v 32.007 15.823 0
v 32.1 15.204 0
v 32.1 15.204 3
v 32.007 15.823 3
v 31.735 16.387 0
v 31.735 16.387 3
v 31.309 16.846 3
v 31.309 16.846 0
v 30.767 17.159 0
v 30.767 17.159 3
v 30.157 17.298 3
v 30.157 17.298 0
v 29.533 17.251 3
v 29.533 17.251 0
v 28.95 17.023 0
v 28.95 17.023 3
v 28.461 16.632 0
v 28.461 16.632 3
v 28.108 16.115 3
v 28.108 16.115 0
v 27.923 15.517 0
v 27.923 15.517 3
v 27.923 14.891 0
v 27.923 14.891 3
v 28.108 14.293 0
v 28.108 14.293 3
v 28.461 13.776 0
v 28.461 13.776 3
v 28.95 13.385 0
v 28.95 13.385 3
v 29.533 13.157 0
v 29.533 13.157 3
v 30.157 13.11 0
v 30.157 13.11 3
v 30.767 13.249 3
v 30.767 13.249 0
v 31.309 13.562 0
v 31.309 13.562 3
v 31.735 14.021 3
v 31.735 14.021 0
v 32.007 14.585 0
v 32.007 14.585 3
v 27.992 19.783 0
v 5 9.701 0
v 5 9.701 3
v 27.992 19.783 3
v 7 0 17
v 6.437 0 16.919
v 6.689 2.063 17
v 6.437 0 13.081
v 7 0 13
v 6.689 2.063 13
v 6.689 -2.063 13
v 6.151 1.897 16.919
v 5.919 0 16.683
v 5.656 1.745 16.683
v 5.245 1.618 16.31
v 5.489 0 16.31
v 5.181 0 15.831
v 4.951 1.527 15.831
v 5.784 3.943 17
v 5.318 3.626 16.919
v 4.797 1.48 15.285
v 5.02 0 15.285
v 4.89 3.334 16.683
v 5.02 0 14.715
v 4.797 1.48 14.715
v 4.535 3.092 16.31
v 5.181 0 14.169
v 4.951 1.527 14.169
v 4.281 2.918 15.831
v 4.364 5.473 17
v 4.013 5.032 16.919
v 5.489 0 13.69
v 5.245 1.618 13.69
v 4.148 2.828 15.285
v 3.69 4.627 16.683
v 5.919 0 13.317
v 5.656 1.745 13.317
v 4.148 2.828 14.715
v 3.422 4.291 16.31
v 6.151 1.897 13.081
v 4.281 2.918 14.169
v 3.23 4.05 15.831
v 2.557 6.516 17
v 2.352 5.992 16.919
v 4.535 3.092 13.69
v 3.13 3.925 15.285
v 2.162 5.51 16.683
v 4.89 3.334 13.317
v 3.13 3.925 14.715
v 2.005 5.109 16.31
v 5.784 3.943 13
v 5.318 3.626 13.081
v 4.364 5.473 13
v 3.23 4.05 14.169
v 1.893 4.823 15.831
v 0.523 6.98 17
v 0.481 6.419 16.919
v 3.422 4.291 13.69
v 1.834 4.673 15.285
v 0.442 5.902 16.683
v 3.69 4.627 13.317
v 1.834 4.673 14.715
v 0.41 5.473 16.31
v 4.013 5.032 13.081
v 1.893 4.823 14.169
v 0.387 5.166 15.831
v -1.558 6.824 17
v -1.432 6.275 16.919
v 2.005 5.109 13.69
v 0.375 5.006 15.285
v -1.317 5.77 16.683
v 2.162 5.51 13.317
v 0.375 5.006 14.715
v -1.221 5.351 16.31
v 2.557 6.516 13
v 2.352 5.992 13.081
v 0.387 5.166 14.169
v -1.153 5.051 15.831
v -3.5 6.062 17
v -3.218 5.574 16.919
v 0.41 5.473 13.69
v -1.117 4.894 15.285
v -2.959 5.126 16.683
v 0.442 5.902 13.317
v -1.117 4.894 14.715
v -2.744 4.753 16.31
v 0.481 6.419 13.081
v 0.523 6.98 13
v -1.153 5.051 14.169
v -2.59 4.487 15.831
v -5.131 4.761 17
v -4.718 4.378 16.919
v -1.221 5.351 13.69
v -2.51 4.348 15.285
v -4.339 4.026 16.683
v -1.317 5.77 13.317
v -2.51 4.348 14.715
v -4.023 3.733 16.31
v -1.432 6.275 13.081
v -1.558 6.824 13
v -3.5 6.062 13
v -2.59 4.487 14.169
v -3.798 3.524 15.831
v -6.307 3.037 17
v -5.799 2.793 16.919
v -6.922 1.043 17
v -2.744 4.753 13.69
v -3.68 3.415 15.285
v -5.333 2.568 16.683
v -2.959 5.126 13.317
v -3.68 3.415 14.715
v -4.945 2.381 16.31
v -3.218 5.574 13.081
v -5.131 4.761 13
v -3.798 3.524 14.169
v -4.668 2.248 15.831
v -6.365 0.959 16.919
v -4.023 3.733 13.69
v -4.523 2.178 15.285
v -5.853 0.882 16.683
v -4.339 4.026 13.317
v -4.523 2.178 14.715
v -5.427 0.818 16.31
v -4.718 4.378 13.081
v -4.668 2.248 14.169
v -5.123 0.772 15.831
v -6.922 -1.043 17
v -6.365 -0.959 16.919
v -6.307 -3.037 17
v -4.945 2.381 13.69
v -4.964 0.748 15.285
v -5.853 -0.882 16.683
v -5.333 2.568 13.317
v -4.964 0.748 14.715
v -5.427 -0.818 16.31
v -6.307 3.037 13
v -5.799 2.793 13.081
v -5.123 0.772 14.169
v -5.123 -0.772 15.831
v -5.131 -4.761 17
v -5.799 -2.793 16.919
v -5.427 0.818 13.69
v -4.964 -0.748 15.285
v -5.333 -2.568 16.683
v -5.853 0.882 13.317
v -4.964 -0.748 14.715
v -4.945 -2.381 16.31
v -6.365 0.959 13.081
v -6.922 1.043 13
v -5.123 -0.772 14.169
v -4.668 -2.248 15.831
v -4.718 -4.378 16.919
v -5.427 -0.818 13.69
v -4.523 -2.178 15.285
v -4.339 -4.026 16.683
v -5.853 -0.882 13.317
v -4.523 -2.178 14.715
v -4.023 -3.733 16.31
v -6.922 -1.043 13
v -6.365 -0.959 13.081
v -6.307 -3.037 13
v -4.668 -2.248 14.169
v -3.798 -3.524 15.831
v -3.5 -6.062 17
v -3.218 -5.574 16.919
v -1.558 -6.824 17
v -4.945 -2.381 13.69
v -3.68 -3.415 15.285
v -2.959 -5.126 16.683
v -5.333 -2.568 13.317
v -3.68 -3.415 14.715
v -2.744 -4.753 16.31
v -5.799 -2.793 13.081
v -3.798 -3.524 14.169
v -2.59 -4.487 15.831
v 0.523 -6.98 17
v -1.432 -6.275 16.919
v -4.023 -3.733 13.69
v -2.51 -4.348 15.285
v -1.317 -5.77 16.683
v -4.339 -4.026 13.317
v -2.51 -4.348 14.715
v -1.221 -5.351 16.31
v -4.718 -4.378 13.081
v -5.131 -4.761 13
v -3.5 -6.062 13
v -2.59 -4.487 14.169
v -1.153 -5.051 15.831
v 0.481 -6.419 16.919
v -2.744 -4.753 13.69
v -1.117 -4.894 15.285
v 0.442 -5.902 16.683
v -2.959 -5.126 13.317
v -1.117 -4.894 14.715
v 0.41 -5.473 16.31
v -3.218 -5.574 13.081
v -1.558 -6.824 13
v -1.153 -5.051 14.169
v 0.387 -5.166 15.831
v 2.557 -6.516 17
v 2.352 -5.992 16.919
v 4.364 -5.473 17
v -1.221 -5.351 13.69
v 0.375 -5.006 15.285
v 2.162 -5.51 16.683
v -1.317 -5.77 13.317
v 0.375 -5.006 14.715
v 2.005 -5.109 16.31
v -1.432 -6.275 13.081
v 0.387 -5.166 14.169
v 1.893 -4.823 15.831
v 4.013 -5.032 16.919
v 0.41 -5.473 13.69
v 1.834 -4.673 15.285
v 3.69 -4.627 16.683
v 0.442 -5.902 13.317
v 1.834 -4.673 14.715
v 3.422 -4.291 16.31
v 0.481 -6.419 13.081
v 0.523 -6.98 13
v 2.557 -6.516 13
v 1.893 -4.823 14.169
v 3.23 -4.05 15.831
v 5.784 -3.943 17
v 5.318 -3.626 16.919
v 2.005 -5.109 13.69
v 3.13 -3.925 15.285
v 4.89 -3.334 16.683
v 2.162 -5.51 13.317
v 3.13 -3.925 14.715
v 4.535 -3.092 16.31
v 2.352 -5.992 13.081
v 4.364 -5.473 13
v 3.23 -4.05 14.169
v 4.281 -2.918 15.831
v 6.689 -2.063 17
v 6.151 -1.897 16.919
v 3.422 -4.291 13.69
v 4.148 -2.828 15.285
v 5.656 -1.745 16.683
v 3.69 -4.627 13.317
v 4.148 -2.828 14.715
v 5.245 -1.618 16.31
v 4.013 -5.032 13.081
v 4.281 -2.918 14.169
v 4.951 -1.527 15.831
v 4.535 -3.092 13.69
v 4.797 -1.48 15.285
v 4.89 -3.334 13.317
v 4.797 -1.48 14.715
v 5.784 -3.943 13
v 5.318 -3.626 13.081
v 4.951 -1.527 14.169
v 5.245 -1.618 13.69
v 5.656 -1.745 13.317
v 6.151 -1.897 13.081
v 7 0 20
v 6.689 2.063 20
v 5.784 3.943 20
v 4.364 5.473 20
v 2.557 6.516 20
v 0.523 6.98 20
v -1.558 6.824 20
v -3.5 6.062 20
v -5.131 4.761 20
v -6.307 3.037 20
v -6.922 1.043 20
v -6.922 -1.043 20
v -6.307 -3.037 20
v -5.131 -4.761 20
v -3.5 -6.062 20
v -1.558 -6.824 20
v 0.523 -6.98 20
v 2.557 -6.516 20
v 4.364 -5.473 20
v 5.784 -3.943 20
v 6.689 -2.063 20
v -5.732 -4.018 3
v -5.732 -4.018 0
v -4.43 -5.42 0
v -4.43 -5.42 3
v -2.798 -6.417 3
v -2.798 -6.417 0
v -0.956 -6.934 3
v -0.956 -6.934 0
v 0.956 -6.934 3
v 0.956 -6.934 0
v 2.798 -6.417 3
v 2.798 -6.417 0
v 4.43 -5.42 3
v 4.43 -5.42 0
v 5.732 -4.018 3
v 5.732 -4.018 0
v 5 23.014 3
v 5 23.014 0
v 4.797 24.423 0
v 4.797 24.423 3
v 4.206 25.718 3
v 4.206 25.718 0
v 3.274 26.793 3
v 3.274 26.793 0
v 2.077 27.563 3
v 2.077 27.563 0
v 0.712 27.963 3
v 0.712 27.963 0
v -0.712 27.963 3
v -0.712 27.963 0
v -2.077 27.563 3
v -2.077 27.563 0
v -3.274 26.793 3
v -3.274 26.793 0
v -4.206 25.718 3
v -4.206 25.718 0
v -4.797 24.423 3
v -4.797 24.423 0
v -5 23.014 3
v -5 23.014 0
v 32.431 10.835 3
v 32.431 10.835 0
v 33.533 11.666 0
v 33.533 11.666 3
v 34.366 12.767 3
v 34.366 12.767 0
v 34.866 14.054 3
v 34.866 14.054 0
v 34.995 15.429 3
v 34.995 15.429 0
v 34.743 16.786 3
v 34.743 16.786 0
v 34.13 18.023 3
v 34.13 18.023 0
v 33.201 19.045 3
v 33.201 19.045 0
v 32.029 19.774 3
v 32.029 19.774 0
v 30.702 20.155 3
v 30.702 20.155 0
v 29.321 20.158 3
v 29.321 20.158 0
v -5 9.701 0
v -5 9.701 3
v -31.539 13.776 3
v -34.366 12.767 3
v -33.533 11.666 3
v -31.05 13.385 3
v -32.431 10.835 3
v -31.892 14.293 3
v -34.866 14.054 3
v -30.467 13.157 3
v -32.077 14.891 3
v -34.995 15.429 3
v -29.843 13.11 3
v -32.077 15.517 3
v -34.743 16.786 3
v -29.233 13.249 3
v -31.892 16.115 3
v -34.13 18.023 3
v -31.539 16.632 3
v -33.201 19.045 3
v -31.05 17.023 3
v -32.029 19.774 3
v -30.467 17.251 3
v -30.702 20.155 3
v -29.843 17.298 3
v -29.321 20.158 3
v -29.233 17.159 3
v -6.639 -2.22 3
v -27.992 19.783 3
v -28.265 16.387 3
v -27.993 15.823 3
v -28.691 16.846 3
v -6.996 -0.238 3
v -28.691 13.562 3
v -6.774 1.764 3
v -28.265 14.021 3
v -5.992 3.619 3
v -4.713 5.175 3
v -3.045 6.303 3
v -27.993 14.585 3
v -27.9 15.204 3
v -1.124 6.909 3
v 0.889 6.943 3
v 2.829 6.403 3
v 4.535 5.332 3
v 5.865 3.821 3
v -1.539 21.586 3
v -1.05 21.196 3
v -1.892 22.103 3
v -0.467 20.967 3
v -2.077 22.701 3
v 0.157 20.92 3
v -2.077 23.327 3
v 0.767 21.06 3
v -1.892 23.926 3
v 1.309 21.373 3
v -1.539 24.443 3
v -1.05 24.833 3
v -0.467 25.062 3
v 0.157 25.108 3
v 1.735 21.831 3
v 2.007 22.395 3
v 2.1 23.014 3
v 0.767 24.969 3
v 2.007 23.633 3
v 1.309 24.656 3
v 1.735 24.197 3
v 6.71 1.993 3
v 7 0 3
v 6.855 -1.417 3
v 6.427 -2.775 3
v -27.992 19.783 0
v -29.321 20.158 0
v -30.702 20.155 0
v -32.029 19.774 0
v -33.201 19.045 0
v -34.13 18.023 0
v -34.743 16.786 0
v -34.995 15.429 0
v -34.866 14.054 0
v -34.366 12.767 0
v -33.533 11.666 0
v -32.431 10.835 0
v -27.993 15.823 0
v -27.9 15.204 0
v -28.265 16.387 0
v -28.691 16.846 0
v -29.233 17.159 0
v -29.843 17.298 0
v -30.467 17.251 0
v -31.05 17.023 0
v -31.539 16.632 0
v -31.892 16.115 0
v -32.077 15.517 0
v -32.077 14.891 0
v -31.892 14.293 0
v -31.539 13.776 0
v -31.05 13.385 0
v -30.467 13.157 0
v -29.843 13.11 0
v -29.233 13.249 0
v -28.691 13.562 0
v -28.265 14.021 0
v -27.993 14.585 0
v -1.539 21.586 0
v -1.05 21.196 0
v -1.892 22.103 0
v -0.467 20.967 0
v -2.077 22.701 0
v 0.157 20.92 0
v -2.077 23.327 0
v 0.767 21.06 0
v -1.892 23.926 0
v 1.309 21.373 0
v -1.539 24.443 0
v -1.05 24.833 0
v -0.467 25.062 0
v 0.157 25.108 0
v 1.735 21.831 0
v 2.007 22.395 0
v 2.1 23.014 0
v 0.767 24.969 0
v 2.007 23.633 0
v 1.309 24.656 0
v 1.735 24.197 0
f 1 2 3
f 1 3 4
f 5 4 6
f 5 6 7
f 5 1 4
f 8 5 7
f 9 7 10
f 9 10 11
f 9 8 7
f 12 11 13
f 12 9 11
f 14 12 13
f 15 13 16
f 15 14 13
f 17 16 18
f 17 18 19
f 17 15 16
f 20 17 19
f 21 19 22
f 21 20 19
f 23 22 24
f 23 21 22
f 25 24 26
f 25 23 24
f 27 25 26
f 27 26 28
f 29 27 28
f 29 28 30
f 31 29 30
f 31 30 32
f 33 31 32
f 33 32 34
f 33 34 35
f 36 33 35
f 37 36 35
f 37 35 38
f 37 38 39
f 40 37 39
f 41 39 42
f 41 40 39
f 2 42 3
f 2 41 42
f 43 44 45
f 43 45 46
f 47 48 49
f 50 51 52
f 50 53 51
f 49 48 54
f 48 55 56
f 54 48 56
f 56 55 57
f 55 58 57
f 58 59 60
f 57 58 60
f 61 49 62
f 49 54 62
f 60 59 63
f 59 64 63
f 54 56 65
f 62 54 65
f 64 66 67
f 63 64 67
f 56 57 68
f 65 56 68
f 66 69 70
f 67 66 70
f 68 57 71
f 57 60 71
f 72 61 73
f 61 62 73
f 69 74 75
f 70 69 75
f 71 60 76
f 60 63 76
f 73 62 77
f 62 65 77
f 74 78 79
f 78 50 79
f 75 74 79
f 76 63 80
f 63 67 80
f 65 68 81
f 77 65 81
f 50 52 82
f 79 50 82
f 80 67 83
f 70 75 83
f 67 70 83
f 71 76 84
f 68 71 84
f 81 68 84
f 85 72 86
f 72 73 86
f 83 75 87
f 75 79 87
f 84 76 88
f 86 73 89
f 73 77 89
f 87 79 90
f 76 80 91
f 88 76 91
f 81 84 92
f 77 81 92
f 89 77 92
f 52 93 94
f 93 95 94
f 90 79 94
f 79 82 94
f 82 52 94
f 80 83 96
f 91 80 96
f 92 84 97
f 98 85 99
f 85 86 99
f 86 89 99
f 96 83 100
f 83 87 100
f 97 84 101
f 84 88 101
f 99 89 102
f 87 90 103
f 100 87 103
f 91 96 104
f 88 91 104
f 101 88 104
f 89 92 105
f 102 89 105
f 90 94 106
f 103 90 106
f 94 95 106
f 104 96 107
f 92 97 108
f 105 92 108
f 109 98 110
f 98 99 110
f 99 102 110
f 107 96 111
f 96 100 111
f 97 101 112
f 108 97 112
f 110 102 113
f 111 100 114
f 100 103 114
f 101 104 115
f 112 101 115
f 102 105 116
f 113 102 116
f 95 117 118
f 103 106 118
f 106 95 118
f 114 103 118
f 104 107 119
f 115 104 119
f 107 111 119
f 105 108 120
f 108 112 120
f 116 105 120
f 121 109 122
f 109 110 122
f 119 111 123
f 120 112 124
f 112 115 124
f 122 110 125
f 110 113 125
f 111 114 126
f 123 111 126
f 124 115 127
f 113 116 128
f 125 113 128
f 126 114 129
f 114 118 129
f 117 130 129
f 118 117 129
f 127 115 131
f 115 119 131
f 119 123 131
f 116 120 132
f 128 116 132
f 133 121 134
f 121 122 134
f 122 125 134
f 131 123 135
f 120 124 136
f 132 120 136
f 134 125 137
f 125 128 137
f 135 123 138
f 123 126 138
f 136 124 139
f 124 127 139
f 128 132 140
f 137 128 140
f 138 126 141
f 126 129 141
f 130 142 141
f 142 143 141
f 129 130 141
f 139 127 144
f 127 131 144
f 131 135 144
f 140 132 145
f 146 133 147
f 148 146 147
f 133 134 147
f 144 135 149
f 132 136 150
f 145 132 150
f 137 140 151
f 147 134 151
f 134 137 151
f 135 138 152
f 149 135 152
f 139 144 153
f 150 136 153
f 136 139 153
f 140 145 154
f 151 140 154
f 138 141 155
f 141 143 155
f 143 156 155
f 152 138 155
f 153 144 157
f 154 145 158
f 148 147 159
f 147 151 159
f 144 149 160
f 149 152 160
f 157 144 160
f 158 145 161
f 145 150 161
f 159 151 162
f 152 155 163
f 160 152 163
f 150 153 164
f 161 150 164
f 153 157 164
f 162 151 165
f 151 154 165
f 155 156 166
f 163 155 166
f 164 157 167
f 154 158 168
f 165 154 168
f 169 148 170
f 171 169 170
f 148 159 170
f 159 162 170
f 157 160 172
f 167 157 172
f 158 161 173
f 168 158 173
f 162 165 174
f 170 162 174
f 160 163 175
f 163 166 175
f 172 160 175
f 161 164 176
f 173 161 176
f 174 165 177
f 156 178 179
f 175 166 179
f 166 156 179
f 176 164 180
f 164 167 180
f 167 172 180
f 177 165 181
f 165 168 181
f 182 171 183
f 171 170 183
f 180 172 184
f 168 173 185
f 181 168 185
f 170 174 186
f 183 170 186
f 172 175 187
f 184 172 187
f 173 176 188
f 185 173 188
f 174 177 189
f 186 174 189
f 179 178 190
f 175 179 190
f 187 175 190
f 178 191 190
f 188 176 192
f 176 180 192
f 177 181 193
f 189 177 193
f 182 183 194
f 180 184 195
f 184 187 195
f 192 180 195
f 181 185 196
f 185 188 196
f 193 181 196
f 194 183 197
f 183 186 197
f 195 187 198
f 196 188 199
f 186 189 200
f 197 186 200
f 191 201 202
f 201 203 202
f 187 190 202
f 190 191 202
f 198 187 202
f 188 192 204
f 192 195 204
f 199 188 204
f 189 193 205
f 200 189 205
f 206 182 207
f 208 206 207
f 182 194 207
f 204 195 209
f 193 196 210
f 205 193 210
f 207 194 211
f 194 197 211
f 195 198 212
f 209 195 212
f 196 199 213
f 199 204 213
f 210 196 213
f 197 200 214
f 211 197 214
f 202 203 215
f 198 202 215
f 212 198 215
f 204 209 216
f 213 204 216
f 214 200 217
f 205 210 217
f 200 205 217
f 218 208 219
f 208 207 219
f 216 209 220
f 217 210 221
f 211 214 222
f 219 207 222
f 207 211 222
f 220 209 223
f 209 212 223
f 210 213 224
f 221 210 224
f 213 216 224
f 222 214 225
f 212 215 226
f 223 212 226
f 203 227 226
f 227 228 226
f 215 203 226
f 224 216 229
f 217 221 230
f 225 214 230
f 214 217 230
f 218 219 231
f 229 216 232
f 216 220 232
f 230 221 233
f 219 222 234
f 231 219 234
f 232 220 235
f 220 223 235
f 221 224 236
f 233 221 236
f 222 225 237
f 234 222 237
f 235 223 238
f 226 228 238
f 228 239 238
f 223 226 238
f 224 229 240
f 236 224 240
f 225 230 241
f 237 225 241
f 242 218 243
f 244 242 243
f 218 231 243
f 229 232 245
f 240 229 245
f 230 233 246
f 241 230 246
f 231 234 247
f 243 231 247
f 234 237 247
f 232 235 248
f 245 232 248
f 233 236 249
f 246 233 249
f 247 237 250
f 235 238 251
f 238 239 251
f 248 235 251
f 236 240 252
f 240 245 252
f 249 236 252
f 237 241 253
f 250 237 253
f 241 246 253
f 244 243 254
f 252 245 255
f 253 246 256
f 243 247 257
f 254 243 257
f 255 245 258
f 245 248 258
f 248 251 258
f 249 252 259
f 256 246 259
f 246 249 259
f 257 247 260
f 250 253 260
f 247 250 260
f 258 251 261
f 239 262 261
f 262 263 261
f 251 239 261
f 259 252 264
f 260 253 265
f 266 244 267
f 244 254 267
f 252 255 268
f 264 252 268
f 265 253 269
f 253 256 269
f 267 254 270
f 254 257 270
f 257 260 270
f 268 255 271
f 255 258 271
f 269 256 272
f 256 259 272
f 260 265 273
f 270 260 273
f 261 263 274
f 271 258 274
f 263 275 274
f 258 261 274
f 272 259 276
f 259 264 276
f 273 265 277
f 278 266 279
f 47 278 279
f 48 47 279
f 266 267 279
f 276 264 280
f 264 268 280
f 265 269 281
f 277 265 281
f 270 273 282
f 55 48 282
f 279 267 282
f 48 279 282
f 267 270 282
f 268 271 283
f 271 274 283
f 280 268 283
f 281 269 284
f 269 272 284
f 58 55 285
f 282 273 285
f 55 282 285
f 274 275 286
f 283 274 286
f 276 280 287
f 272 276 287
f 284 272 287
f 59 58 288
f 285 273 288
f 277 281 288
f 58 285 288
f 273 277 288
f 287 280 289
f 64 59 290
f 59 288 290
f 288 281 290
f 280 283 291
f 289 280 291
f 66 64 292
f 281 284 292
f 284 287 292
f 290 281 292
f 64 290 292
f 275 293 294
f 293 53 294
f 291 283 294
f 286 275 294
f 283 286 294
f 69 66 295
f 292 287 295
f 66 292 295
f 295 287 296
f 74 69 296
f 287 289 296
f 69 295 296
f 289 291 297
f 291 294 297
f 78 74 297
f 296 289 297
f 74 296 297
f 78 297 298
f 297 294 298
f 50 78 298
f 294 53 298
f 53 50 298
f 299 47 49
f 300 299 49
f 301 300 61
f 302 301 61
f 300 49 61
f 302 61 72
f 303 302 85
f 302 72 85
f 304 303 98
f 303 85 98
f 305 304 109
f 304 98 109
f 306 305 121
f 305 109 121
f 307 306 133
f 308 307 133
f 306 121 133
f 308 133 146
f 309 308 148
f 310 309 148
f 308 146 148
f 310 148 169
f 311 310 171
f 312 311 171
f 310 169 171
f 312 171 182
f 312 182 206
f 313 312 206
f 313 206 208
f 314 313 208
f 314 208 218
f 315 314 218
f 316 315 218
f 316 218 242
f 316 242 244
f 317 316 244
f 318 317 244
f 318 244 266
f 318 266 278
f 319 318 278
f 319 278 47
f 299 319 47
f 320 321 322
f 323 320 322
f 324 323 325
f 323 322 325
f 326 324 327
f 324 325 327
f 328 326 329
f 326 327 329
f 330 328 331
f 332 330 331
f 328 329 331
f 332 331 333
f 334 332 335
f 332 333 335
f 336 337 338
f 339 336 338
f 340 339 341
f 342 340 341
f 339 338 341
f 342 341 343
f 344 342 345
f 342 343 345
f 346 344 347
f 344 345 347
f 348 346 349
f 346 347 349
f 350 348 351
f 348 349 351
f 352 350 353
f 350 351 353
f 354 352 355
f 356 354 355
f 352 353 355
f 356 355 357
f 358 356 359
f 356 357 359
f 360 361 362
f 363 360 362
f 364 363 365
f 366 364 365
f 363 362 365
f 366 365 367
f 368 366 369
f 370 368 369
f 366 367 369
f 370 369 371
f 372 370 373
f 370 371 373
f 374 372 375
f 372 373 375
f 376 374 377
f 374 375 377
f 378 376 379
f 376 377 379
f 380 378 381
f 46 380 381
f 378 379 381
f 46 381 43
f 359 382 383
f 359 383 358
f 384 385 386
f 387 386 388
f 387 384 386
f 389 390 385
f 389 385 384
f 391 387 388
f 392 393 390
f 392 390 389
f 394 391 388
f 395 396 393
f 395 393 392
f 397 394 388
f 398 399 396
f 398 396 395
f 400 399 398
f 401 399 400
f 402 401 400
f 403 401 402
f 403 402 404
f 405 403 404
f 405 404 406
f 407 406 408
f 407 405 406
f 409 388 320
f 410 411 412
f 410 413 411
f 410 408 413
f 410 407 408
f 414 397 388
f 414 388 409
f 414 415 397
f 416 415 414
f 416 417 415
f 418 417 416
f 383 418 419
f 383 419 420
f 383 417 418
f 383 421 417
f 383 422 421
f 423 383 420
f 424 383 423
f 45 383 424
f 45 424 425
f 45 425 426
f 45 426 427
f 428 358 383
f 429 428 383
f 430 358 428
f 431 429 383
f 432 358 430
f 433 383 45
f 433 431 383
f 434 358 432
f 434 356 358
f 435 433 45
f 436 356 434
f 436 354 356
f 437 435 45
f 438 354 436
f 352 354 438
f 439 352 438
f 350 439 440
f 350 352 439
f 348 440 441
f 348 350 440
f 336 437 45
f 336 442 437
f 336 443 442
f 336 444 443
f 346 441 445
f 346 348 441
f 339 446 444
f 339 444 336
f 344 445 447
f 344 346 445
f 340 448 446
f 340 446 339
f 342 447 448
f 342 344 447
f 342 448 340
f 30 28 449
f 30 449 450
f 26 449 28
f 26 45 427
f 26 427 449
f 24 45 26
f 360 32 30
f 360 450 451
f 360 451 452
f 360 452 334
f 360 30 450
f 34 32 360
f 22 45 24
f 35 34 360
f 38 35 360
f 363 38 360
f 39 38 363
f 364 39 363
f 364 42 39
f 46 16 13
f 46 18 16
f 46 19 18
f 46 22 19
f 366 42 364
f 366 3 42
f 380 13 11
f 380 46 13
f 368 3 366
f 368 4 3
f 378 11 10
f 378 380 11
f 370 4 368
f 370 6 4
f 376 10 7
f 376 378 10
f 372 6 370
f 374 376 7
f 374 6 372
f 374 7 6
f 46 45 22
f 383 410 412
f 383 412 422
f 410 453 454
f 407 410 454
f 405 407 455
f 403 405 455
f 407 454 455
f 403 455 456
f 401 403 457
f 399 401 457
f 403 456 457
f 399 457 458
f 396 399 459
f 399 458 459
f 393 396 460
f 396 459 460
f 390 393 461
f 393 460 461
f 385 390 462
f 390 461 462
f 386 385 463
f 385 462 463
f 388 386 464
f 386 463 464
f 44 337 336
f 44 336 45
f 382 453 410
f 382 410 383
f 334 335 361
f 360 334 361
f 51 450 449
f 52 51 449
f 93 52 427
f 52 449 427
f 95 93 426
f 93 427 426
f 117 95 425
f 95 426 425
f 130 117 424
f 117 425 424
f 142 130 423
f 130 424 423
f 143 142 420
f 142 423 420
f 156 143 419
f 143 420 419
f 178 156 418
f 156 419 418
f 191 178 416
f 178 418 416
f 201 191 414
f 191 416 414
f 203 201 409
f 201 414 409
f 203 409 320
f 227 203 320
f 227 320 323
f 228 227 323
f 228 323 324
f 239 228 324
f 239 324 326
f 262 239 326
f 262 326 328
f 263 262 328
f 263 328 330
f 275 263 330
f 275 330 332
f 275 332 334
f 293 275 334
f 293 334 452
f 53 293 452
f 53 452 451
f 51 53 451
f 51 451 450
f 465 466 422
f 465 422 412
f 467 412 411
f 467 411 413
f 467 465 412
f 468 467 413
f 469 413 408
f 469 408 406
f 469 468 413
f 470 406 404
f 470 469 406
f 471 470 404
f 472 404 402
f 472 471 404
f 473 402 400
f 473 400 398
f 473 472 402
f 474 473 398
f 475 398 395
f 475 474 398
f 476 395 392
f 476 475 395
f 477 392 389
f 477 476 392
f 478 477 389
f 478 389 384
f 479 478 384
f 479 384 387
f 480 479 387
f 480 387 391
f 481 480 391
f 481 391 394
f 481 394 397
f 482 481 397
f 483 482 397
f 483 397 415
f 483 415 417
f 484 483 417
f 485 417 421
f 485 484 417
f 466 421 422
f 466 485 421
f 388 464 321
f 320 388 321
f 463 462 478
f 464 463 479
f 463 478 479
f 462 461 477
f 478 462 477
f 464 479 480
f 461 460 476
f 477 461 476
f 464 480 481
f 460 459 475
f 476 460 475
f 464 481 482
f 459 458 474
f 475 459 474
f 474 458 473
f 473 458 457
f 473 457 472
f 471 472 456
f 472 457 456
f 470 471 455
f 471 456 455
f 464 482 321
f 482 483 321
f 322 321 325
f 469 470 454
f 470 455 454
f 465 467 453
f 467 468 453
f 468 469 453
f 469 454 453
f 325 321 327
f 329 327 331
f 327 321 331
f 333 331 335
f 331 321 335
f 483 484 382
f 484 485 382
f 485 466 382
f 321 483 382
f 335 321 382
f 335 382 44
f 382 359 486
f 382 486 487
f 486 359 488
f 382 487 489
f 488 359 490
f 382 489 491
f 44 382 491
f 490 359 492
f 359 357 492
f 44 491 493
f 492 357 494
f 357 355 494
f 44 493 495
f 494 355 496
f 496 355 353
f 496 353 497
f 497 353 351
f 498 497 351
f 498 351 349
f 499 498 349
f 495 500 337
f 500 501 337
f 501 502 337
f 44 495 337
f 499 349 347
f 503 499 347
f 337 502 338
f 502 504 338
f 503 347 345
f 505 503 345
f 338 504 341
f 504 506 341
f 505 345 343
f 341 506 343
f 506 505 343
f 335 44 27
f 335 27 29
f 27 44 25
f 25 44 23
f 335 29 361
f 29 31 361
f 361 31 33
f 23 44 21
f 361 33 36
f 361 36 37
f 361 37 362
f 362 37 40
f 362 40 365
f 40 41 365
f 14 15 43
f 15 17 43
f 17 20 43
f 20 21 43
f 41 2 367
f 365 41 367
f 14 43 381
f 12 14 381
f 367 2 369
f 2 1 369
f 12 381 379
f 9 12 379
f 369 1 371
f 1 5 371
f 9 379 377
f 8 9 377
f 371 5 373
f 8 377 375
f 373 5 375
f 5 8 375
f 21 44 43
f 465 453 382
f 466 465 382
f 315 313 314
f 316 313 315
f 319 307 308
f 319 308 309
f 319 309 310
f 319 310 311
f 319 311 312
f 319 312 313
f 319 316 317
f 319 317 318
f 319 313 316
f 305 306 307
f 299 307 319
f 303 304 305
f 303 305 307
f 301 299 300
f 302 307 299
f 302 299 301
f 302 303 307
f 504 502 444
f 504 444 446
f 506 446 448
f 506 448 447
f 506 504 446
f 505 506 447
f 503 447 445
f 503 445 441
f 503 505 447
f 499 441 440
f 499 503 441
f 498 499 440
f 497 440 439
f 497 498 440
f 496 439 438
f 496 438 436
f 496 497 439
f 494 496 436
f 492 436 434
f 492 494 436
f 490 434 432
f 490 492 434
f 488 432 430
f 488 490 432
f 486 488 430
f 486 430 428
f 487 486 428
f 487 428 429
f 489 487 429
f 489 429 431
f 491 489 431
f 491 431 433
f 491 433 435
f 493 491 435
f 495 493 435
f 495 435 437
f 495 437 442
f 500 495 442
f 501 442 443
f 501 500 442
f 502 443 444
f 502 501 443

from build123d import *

# Parameters (mm, degrees)
TORUS001_R        = 2
SKETCH003_R       = 2.1
PAD003_DEPTH      = 3
CYLINDER005_R     = 7
CYLINDER005_DEPTH = 20


with BuildPart() as torus001:
    # Torus001 → Torus001 (revolve)
    with BuildSketch(Plane(origin=(0, 0, 15), x_dir=(1, 0, 0), z_dir=(0, -1, 0))):
        with Locations((7, 0)):
            Circle(TORUS001_R)
    revolve(axis=Axis((0, 0, 15), (0, 0, 1)))


with BuildPart() as base_body001:
    # Sketch003 → Pad003 (new body)
    with BuildSketch(Plane.XY):
        with BuildLine():
            Line((-32.430713, 10.8347), (-5.732093, -4.017849))
            ThreePointArc((-5.732093, -4.017849), (0, -7), (5.732093, -4.017849))
            Line((5.732093, -4.017849), (32.430713, 10.8347))
            ThreePointArc((32.430713, 10.8347), (34.479244, 17.425892), (27.992075, 19.783207))
            Line((5, 9.701256), (27.992075, 19.783207))
            Line((5, 23.014347), (5, 9.701256))
            ThreePointArc((5, 23.014347), (0, 28.014347), (-5, 23.014347))
            Line((-5, 9.701256), (-5, 23.014347))
            Line((-27.992075, 19.783207), (-5, 9.701256))
            ThreePointArc((-27.992075, 19.783207), (-34.479244, 17.425892), (-32.430713, 10.8347))
        make_face()
        with Locations((-30, 15.204098)):
            Circle(SKETCH003_R, mode=Mode.SUBTRACT)
        with Locations((30, 15.204098)):
            Circle(SKETCH003_R, mode=Mode.SUBTRACT)
        with Locations((0, 23.014347)):
            Circle(SKETCH003_R, mode=Mode.SUBTRACT)
    extrude(amount=PAD003_DEPTH)


with BuildPart() as base_cut_for_big_metal_plate:
    # Cylinder005 → Cylinder005 (new body)
    with BuildSketch(Plane.XY):
        Circle(CYLINDER005_R)
    extrude(amount=CYLINDER005_DEPTH)

    # Fusion005: union base body001
    add(base_body001.part)

    # Cut003004: cut Torus001
    add(torus001.part, mode=Mode.SUBTRACT)


solid = base_cut_for_big_metal_plate.part
